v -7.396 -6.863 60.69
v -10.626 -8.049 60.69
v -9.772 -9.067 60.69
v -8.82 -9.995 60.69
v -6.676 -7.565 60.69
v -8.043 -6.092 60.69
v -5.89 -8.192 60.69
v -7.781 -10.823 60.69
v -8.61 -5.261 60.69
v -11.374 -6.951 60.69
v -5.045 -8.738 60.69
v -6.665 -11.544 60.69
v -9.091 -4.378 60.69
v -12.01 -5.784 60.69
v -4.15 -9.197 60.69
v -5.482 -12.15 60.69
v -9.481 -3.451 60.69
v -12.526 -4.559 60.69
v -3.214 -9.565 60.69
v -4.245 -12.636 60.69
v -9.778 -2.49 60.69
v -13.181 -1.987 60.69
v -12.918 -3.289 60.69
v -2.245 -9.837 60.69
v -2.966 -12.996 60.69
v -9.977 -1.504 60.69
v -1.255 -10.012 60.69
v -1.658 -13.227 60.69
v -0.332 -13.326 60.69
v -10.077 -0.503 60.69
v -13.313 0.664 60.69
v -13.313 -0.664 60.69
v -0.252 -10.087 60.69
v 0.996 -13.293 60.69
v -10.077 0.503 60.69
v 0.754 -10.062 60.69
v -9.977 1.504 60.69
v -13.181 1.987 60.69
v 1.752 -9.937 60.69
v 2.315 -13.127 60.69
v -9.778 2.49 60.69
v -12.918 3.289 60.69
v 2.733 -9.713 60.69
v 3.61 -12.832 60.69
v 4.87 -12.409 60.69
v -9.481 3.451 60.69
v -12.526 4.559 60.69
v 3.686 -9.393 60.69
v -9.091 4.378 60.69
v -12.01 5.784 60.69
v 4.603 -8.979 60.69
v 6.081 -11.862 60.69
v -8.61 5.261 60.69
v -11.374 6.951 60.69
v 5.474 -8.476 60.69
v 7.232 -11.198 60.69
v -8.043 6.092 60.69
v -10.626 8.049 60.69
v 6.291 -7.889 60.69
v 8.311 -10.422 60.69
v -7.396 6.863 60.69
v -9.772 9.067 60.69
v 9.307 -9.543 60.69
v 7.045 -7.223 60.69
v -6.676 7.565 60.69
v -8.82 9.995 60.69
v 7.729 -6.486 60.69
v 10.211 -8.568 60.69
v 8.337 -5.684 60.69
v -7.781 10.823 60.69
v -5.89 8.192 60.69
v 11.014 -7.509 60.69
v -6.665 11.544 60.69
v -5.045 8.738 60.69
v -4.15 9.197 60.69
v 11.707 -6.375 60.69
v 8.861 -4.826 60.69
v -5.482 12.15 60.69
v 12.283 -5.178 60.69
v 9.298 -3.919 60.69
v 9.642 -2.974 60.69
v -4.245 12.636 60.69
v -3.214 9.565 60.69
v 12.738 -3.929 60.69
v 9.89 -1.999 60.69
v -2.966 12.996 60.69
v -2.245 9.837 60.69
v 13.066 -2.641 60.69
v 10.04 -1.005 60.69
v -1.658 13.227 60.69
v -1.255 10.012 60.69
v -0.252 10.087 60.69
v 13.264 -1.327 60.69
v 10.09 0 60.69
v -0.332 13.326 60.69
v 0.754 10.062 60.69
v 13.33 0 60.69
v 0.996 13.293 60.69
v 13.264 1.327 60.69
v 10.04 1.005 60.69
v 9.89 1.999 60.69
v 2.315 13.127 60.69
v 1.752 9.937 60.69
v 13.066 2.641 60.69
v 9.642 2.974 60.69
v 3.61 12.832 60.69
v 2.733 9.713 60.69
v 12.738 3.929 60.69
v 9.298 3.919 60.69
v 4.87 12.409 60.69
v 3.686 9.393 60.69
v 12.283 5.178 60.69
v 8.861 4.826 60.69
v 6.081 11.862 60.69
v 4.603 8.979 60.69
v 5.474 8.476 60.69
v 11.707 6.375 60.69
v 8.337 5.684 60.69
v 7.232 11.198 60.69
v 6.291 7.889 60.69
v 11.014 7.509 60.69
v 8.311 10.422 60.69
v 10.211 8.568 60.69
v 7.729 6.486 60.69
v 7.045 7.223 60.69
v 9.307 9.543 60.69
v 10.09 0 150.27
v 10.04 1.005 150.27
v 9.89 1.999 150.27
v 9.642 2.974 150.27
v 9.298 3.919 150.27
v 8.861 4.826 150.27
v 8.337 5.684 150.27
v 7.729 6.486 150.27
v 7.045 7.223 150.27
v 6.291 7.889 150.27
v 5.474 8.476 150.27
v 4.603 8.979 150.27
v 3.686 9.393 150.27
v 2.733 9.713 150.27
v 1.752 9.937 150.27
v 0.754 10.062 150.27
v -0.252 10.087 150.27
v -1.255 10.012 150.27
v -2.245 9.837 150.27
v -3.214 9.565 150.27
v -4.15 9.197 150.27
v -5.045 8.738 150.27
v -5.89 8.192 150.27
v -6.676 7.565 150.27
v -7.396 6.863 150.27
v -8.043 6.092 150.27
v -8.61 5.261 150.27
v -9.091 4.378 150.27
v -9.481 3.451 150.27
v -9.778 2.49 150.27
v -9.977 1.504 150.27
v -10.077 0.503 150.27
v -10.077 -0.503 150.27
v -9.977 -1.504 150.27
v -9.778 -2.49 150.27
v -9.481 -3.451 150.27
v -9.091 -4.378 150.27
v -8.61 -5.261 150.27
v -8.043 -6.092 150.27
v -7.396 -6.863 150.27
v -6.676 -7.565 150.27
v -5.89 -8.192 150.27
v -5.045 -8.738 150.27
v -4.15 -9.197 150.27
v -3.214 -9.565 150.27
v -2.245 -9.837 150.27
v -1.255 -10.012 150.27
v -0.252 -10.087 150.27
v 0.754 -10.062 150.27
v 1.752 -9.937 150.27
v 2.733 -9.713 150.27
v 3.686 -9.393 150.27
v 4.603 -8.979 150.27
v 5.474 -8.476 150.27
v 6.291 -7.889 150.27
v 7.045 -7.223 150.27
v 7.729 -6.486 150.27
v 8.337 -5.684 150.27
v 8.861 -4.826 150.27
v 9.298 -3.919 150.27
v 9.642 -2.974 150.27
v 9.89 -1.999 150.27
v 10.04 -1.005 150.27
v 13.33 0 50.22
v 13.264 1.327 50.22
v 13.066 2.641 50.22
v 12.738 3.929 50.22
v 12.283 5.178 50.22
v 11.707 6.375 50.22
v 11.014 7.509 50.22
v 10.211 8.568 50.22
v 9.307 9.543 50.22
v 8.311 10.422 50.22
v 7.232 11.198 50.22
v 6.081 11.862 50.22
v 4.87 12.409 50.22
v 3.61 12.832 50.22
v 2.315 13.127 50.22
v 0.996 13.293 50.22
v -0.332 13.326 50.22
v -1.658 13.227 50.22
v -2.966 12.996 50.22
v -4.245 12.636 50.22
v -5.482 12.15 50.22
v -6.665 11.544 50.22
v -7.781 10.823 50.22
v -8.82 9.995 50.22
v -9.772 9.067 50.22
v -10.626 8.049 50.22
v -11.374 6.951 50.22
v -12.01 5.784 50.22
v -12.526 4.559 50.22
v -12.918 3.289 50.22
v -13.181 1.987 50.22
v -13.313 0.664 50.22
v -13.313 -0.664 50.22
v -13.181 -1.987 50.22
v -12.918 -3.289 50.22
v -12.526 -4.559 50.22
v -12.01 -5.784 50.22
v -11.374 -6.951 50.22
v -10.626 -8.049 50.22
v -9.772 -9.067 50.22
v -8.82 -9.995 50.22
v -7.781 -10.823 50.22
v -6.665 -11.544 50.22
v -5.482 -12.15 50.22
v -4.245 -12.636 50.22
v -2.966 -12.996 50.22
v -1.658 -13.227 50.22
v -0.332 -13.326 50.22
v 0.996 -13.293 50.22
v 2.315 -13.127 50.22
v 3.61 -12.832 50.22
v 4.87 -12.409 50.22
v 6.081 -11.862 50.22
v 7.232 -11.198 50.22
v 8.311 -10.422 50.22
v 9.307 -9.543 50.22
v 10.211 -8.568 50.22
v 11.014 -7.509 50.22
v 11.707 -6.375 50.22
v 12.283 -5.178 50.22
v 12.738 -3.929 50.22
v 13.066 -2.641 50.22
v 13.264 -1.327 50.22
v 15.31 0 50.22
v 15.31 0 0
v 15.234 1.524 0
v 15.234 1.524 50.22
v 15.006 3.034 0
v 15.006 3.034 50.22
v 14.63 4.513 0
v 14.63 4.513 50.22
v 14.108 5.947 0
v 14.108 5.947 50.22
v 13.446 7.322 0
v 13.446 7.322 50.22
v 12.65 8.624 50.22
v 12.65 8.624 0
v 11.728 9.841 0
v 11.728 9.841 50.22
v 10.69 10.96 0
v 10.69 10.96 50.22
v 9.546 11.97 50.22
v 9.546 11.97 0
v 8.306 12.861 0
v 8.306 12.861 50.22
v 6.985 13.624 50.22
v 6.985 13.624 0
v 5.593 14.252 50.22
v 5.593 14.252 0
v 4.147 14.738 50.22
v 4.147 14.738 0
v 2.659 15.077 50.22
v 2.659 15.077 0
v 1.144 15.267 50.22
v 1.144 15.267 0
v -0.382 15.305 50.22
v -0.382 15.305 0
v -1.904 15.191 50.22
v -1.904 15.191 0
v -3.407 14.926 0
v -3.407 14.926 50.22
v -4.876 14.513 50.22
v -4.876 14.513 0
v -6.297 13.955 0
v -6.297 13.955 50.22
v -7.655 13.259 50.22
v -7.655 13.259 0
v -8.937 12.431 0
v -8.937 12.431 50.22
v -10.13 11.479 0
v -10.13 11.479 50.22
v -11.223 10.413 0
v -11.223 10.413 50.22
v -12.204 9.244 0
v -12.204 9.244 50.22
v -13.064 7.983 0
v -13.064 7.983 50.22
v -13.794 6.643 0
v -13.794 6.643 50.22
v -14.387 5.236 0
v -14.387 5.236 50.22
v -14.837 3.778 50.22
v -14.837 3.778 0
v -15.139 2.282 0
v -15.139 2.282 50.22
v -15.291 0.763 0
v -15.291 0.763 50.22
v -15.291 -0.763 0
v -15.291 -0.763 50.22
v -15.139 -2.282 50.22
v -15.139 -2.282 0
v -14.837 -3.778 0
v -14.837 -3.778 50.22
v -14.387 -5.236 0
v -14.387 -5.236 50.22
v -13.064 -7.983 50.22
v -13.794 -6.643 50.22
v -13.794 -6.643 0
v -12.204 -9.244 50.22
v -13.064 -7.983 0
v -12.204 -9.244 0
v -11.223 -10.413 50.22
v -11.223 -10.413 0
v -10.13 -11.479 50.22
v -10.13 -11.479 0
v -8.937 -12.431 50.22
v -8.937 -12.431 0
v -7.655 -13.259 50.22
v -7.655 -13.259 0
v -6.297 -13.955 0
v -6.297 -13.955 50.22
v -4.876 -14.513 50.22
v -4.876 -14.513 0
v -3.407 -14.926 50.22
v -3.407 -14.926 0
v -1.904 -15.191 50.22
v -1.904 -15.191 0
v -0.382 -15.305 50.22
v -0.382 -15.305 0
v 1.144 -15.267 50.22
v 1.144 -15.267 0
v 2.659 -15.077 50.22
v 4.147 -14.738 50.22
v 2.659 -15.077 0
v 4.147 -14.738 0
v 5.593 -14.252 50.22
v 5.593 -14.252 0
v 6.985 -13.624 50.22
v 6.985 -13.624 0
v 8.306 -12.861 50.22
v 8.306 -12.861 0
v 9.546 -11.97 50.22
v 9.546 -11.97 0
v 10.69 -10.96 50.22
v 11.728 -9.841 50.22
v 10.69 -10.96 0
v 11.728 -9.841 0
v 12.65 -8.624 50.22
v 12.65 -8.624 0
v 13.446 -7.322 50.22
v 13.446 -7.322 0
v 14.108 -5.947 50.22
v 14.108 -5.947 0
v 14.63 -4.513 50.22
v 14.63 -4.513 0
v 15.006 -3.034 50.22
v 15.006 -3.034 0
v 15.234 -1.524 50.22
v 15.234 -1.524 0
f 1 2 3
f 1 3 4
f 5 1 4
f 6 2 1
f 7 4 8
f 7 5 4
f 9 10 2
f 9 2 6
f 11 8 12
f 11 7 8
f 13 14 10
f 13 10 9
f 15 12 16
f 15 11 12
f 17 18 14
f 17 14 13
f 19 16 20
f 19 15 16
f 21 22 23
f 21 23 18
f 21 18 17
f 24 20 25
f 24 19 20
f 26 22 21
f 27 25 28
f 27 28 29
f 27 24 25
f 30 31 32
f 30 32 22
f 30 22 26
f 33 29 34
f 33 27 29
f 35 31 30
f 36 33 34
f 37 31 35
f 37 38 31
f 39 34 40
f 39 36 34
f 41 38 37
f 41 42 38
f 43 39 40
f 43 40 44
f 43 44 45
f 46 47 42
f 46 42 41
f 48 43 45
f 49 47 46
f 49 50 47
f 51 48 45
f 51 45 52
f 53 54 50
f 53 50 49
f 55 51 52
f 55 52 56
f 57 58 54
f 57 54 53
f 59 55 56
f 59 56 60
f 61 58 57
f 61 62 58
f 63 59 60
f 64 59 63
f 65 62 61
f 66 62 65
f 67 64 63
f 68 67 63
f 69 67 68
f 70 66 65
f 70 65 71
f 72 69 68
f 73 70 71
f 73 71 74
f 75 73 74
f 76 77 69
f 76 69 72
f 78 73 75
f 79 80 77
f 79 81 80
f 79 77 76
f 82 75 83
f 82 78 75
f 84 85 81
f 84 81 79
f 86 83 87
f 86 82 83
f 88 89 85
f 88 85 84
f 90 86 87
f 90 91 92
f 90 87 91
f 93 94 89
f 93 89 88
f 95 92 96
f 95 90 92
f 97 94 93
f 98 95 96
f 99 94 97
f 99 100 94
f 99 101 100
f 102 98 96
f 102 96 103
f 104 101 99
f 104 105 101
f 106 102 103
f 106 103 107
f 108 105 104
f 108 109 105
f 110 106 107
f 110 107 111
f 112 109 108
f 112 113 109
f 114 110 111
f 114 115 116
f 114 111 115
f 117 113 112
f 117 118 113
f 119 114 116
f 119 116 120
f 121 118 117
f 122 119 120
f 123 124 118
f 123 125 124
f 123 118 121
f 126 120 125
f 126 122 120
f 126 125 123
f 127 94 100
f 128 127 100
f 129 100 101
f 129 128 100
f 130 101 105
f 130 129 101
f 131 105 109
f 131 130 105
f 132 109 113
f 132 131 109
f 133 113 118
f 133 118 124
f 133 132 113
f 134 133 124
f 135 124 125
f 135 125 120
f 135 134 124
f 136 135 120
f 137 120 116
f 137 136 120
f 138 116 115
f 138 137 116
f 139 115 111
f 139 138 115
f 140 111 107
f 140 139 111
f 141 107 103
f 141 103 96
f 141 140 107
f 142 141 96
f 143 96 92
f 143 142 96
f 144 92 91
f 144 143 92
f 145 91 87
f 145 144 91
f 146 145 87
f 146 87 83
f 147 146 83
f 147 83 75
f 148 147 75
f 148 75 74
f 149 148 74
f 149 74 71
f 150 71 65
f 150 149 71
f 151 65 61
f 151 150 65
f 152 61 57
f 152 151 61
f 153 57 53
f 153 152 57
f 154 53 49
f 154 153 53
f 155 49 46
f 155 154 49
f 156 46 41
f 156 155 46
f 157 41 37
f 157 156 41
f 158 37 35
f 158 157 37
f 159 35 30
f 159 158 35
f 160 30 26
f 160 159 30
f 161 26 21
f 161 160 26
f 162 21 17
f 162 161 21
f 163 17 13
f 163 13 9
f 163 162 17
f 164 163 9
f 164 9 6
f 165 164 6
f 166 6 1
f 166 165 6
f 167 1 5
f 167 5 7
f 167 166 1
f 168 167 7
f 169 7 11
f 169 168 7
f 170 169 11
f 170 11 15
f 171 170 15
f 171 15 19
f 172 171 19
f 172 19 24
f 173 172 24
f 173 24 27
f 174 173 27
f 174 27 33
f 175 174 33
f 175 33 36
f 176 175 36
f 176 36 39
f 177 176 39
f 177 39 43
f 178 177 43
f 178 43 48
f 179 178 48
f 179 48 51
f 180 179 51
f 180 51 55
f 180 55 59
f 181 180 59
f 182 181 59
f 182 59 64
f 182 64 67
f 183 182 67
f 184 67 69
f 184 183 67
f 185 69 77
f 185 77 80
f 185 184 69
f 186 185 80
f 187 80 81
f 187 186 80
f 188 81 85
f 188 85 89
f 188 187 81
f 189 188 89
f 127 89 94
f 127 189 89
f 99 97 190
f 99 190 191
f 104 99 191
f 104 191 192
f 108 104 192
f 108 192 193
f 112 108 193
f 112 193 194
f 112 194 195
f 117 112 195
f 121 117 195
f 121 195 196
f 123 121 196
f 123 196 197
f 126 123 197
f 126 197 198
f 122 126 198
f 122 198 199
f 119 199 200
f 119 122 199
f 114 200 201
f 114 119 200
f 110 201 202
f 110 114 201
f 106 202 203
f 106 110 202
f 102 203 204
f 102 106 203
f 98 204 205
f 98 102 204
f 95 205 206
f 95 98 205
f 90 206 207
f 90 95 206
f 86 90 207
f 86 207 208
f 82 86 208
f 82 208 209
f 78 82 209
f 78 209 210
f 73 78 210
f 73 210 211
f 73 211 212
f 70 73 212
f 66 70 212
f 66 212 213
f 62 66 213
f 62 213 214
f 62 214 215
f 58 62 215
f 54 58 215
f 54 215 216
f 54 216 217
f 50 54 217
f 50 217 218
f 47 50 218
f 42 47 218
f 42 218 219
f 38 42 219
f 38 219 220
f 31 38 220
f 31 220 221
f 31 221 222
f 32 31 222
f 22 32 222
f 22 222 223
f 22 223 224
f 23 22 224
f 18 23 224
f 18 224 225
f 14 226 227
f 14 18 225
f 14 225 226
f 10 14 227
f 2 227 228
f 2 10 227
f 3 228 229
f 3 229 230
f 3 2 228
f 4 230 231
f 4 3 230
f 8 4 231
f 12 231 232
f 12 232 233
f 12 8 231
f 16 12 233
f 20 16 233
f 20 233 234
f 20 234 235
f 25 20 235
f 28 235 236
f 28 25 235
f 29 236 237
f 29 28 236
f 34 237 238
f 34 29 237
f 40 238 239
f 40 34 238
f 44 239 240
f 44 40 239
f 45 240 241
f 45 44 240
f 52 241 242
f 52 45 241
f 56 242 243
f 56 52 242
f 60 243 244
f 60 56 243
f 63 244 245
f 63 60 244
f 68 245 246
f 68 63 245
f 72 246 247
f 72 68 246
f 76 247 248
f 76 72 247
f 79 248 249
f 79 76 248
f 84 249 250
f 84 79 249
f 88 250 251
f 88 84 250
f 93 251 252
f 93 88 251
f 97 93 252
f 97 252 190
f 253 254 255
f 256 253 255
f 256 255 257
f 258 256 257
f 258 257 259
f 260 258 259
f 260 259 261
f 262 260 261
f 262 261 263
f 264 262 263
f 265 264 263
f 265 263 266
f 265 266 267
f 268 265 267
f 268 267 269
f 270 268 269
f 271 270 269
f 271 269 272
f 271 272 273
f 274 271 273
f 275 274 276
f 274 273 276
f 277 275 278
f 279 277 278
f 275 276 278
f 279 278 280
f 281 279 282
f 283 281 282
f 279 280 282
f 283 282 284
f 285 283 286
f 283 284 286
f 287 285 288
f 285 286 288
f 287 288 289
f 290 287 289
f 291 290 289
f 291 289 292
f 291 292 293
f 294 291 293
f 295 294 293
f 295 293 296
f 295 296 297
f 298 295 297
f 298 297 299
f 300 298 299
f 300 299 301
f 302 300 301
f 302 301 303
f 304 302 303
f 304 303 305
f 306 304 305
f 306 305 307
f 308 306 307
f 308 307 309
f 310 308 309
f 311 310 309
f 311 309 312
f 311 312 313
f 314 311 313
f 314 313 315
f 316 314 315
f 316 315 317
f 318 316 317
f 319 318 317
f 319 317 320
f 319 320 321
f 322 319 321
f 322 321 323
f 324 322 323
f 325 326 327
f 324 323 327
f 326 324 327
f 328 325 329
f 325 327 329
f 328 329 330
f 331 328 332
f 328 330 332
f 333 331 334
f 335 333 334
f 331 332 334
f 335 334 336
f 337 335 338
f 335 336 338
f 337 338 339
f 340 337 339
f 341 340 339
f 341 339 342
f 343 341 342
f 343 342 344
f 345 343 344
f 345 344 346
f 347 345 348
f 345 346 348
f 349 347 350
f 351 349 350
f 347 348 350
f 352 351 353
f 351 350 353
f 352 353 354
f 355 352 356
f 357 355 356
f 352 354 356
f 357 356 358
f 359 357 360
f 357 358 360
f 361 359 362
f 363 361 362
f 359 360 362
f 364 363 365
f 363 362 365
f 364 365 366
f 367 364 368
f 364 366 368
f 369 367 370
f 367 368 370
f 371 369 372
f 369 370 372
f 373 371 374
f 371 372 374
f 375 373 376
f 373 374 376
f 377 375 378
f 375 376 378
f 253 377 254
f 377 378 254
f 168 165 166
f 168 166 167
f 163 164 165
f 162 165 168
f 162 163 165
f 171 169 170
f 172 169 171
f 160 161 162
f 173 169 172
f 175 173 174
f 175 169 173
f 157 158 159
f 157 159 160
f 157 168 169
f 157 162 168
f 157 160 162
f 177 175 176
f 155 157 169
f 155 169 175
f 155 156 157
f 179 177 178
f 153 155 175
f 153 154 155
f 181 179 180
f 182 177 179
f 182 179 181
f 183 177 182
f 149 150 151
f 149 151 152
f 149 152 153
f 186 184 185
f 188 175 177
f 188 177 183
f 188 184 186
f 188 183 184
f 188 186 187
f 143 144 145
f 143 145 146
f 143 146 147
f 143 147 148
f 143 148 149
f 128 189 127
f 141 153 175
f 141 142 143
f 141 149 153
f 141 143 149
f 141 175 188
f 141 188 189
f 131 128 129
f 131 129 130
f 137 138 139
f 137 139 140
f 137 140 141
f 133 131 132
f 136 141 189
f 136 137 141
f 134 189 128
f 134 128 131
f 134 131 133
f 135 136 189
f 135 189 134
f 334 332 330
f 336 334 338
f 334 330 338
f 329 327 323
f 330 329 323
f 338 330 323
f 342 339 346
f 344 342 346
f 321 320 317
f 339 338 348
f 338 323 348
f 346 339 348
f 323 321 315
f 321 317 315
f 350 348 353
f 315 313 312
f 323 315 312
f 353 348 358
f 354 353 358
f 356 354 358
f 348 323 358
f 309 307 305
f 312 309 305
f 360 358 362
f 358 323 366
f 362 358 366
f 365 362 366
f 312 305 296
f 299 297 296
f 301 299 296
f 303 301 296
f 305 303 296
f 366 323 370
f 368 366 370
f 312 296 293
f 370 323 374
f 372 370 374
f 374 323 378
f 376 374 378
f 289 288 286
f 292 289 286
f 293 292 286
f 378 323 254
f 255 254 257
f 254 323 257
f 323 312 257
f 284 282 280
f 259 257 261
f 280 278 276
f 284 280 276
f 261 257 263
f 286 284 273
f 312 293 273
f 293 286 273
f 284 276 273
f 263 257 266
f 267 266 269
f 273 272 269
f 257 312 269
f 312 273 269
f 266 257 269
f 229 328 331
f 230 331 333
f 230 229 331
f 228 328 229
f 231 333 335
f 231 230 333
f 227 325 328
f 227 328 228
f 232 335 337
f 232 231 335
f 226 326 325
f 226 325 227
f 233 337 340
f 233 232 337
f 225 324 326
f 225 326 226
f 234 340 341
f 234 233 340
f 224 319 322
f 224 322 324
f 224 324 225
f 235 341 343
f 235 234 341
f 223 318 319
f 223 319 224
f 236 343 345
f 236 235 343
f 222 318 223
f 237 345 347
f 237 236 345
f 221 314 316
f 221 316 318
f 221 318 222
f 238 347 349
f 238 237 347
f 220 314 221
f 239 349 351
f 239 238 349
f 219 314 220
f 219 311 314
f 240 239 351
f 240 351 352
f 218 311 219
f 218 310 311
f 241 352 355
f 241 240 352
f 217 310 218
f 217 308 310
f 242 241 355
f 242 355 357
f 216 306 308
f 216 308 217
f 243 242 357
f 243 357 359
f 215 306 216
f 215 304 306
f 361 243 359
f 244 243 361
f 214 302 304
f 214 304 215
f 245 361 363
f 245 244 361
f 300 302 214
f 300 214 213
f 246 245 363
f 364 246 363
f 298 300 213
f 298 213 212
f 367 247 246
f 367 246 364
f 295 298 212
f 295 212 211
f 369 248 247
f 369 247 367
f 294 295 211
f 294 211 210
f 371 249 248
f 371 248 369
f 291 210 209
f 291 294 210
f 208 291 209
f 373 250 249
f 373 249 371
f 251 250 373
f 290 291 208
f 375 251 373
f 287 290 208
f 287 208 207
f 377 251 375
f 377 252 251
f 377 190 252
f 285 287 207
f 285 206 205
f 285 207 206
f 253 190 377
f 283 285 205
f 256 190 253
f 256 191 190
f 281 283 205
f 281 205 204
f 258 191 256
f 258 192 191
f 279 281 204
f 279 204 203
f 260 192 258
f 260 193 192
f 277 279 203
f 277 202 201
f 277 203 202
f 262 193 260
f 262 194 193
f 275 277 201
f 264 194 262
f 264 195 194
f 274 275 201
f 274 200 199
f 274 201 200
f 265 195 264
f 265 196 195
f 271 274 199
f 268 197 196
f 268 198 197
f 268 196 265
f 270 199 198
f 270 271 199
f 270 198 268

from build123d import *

# Parameters (mm, degrees)
F0_R     = 15.31
F1_DEPTH = 150.27
F2_R     = 15.31
F2_R_2   = 13.33
F3_DEPTH = 100.05
F4_R     = 13.33
F4_R_2   = 10.09
F5_DEPTH = 89.580001


with BuildPart() as f1:
    # F0 (on Top) → F1 (new body)
    with BuildSketch(Plane.XY):
        Circle(F0_R)
    extrude(amount=F1_DEPTH)

    # F2 (on face) → F3 (cut)
    with BuildSketch(Plane.XY.offset(150.27)):
        Circle(F2_R)
        Circle(F2_R_2, mode=Mode.SUBTRACT)
    extrude(amount=-F3_DEPTH, mode=Mode.SUBTRACT)

    # F4 (on face) → F5 (cut)
    with BuildSketch(Plane.XY.offset(150.27)):
        Circle(F4_R)
        Circle(F4_R_2, mode=Mode.SUBTRACT)
    extrude(amount=-F5_DEPTH, mode=Mode.SUBTRACT)


solid = f1.part
